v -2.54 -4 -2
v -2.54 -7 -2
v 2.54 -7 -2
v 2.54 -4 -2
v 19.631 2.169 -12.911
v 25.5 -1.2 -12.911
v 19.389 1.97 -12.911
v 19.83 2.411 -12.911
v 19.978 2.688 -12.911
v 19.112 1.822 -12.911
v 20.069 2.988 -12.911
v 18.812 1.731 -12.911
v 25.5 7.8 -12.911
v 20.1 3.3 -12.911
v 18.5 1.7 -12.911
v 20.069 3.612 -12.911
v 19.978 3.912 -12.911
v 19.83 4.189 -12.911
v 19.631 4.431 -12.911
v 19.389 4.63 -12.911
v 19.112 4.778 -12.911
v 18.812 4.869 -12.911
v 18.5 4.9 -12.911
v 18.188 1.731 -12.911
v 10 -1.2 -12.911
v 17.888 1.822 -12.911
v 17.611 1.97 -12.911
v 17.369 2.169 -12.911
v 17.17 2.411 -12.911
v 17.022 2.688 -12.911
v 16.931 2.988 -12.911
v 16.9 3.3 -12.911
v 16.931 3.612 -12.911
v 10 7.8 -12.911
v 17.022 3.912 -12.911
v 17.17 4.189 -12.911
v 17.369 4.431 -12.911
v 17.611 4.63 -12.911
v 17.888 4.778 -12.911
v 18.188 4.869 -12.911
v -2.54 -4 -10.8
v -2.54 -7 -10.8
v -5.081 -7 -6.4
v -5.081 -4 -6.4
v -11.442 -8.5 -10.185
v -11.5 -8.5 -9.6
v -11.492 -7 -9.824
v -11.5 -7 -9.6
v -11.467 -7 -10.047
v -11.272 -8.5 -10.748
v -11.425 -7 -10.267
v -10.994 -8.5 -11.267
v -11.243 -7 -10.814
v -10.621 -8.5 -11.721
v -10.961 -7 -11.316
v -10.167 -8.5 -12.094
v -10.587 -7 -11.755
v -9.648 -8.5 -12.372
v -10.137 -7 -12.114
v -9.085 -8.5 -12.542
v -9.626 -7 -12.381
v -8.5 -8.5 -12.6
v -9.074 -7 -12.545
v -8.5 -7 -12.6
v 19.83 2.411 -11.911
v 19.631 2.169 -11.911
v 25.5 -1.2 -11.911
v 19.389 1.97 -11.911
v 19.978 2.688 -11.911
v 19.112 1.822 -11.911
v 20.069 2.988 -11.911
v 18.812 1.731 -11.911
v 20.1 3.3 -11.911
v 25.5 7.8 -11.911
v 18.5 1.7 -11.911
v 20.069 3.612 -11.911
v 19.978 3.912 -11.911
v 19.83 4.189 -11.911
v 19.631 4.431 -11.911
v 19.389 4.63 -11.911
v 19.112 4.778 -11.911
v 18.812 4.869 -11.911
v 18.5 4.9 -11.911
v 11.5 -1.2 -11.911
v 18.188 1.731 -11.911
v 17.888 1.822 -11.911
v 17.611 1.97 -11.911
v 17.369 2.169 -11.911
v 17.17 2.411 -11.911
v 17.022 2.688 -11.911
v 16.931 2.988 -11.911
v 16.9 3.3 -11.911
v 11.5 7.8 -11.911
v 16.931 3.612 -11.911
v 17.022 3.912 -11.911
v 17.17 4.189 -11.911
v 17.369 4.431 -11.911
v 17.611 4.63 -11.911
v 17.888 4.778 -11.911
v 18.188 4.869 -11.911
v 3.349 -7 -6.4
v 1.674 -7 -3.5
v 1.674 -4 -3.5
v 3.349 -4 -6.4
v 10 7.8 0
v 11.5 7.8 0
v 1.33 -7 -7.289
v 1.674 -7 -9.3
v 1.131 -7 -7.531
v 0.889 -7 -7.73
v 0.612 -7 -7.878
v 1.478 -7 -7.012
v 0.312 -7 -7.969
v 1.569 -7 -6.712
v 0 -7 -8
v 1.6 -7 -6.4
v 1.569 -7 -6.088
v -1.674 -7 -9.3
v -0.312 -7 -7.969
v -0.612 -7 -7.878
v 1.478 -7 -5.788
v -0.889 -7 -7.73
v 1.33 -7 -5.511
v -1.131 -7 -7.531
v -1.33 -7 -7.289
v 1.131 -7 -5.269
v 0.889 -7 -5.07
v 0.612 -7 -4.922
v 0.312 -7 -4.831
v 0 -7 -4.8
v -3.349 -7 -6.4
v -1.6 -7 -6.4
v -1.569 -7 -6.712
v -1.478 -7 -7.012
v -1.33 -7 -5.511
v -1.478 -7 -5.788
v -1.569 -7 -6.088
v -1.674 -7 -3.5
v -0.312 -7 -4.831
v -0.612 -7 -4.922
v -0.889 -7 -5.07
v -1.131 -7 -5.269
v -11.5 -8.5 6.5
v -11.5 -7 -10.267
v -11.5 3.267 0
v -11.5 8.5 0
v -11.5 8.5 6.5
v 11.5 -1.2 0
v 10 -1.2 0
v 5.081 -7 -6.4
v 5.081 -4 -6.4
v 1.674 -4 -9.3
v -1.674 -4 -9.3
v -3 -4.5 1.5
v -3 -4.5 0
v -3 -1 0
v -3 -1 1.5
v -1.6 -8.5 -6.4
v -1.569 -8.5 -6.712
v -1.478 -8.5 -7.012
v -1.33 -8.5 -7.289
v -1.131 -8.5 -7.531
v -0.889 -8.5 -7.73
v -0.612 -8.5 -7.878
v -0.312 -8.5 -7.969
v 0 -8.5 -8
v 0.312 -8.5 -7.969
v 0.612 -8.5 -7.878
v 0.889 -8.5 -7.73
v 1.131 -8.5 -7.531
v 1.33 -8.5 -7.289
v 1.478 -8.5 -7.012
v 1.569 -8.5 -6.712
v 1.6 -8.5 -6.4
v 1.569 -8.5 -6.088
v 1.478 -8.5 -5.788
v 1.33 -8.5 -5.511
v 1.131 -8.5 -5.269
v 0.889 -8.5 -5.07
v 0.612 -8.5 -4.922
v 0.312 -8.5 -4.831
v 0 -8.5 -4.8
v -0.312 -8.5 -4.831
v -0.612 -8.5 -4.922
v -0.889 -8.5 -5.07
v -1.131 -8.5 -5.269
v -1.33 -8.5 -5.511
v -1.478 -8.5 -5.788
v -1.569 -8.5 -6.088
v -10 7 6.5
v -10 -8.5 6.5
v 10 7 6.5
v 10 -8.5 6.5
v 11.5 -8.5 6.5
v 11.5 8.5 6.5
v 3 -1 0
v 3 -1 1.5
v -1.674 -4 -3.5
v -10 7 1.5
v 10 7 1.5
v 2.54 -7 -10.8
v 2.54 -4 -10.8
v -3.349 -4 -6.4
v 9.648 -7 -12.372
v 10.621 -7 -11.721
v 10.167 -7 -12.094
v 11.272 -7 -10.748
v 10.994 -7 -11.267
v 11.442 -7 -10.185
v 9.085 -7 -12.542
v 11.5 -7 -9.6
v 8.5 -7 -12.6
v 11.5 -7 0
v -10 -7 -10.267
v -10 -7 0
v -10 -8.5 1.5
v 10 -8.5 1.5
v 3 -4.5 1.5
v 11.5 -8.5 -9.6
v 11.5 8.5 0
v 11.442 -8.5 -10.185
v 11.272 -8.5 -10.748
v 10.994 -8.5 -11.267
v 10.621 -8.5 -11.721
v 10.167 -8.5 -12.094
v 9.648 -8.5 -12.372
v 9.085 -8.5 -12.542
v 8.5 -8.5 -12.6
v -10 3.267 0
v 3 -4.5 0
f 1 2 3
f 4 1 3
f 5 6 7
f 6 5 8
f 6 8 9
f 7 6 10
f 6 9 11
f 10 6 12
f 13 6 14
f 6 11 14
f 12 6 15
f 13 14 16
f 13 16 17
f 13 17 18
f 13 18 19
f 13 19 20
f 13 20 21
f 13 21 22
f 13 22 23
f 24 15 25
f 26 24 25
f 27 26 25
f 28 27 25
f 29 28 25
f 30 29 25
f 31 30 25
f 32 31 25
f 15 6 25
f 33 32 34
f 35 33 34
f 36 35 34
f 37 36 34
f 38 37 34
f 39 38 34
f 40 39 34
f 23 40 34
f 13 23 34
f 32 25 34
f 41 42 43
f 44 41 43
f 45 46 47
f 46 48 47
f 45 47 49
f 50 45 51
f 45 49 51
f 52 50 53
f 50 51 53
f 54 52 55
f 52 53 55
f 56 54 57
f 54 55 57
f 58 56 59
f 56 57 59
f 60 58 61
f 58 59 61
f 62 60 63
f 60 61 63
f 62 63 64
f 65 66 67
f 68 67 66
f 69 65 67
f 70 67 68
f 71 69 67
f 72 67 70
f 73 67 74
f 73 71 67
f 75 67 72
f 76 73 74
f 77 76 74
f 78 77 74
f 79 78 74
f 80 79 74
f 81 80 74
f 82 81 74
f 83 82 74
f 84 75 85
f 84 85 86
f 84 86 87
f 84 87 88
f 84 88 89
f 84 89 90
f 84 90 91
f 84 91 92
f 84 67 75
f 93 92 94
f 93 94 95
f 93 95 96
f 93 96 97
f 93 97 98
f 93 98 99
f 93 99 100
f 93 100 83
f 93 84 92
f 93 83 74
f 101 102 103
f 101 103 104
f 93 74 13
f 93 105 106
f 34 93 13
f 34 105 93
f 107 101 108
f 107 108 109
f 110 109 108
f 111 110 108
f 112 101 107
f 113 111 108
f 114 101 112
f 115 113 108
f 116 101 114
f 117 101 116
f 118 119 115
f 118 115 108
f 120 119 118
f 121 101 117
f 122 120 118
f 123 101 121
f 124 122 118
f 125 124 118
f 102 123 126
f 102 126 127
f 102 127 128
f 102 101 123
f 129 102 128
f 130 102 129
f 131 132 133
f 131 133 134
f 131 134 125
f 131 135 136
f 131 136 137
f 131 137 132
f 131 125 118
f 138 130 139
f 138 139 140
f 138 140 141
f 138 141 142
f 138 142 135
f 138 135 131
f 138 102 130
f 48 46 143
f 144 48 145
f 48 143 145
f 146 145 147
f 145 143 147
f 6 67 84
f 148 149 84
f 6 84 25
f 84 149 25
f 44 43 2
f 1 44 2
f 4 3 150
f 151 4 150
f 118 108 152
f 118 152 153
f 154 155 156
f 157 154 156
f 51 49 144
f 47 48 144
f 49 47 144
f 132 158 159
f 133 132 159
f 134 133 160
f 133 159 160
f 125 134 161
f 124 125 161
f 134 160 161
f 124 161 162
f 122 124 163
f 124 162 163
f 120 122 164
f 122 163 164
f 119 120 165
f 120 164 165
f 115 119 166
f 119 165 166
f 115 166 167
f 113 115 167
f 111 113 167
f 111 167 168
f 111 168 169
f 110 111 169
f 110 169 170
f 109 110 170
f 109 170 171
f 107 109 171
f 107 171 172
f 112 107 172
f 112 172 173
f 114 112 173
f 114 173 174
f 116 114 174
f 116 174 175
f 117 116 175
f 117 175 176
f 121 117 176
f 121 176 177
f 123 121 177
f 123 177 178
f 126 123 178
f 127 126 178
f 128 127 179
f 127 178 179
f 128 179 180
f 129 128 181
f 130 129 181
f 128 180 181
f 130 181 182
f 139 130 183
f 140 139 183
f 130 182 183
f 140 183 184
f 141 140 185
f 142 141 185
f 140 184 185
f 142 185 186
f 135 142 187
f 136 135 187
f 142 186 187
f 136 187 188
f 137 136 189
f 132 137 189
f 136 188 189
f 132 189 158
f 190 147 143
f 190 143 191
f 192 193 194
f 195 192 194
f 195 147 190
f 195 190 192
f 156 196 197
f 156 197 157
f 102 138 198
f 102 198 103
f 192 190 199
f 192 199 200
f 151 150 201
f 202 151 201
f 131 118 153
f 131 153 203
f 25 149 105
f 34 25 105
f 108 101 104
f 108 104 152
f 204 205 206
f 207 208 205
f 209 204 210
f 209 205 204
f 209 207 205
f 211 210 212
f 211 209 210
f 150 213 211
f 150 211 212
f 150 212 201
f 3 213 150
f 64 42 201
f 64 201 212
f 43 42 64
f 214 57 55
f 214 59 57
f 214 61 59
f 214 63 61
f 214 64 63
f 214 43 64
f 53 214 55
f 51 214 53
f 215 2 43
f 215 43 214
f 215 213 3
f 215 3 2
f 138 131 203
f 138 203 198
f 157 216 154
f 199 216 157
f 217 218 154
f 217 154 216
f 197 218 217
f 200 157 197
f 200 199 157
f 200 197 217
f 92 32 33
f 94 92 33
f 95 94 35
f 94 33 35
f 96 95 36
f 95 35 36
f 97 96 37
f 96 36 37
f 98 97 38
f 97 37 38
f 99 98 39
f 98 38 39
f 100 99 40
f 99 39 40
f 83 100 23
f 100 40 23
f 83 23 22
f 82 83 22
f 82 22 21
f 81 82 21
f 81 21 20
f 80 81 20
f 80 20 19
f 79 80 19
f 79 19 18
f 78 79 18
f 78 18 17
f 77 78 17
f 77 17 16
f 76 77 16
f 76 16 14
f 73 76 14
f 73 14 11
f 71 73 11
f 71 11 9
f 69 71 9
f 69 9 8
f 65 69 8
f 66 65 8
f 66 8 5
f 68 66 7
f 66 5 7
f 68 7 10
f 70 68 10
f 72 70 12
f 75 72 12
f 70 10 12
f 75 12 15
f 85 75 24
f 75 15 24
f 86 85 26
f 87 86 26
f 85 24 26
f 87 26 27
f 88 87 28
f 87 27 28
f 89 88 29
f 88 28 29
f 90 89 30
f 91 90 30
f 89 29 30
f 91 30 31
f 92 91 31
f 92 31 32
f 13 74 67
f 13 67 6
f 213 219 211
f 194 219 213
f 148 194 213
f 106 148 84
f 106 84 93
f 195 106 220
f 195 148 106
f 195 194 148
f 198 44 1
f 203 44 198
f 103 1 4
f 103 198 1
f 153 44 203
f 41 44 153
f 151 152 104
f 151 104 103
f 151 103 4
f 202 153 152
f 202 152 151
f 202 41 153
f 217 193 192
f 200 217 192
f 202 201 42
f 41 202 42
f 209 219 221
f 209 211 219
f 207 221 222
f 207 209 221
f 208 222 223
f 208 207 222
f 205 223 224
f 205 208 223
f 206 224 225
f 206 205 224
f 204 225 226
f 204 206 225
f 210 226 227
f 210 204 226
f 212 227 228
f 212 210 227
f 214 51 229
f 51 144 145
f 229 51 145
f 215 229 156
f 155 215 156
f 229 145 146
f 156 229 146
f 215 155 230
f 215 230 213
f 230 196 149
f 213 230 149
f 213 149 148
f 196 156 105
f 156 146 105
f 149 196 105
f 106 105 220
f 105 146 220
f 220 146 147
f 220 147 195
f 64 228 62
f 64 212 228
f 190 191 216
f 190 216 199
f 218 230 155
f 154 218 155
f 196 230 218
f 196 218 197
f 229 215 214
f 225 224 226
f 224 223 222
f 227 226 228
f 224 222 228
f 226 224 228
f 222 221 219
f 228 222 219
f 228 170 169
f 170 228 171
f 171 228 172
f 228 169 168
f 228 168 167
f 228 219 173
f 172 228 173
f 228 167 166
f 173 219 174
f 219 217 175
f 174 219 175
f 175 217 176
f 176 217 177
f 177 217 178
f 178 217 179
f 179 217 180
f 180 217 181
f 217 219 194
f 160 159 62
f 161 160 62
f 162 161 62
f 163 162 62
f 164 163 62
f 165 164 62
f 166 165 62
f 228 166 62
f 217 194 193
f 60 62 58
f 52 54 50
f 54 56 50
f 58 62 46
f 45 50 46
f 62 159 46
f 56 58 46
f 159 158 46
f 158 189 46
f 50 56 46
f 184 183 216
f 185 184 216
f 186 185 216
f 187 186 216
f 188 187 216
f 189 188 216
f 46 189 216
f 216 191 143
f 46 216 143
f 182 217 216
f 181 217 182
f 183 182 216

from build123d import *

# Parameters (mm, degrees)
SKETCH_1_W             = 23
SKETCH_1_H             = 17
EXTRUDE_1_DEPTH        = 6.5
SKETCH_2_W             = 20
SKETCH_2_H             = 15.5
CUT_EXTRUDE_1_DEPTH    = 5
SKETCH_3_W             = 23
SKETCH_3_H             = 1.5
EXTRUDE_2_DEPTH        = 12.6
FILLET_1_R             = 3
EXTRUDE_3_DEPTH        = 3
HOLE_WIZARD_M3_1_D     = 3.2
EXTRUDE_START          = -11.5
EXTRUDE_6_DEPTH        = 1.5
CUT_EXTRUDE_2534_REACH = 21.059
SKETCH_10_W            = 6
SKETCH_10_H            = 3.5
SKETCH_11_W            = 1.5
SKETCH_11_H            = 9
EXTRUDE_10_DEPTH       = 12.910593501
SKETCH_12_W            = 1
SKETCH_12_H            = 9
EXTRUDE_11_DEPTH       = 14
HOLE_WIZARD_M3_2_D     = 3.2


# Read off the part's stored shape, not the designer's step: 凸台-拉伸6
with BuildPart() as part:
    # 草图1 → 凸台-拉伸1 (new body)
    with BuildSketch(Plane.XY):
        Rectangle(SKETCH_1_W, SKETCH_1_H)
    extrude(amount=EXTRUDE_1_DEPTH)

    # 草图2 → 切除-拉伸1 (cut)
    with BuildSketch(Plane.XY.offset(6.5)):
        with Locations((0, -0.75)):
            Rectangle(SKETCH_2_W, SKETCH_2_H)
    extrude(amount=-CUT_EXTRUDE_1_DEPTH, mode=Mode.SUBTRACT)

    # 草图3 → 凸台-拉伸2 (add)
    with BuildSketch(Plane(origin=(0, 0, 0), x_dir=(-1, 0, 0), z_dir=(0, 0, -1))):
        with Locations((0, -7.75)):
            Rectangle(SKETCH_3_W, SKETCH_3_H)
    extrude(amount=EXTRUDE_2_DEPTH)

    # 圆角1
    fillet_1_edges = [part.edges().sort_by_distance(p)[0] for p in [
        (11.5, -7.75, -12.6),
        (-11.5, -7.75, -12.6),
    ]]
    fillet(fillet_1_edges, radius=FILLET_1_R)

    # 草图4 → 凸台-拉伸3 (add)
    with BuildSketch(Plane(origin=(0, -7, 0), x_dir=(1, 0, 0), z_dir=(0, 1, 0))):
        Polygon((5.080682369, 6.4), (2.540341184, 10.8), (-2.540341184, 10.8), (-5.080682369, 6.4), (-2.540341184, 2), (2.540341184, 2), align=None)
        Polygon((3.348631561, 6.4), (1.674315781, 9.3), (-1.674315781, 9.3), (-3.348631561, 6.4), (-1.674315781, 3.5), (1.674315781, 3.5), align=None, mode=Mode.SUBTRACT)
    extrude(amount=EXTRUDE_3_DEPTH)

    # M3 间隙孔1 (through all)
    with Locations(Plane(origin=(0, -7, 0), x_dir=(1, 0, 0), z_dir=(0, 1, 0))):
        with Locations((0, 6.4)):
            Hole(HOLE_WIZARD_M3_1_D / 2)

    # 凸台-拉伸6 outline → 凸台-拉伸6 (add)
    with BuildSketch(Plane.YZ.offset(EXTRUDE_START)):
        Polygon((-7, 0), (-7, -10.266991259), (3.266991259, 0), align=None)
    extrude(amount=EXTRUDE_6_DEPTH)

    # 草图10 → Cut-Extrude 2534 (cut, up to next)
    with BuildSketch(Plane(origin=(0, 0, 0), x_dir=(-1, 0, 0), z_dir=(0, 0, -1)), mode=Mode.PRIVATE) as cut_extrude_2534_sk1:
        with Locations((0, -2.75)):
            Rectangle(SKETCH_10_W, SKETCH_10_H)
    cut_extrude_2534_tool1 = extrude(cut_extrude_2534_sk1.sketch, amount=-CUT_EXTRUDE_2534_REACH, mode=Mode.PRIVATE) & part.part
    add(cut_extrude_2534_tool1.solids().sort_by_distance((0, -2.75, 0))[0], mode=Mode.SUBTRACT)

    # 草图11 → 凸台-拉伸10 (add)
    with BuildSketch(Plane(origin=(0, 0, 0), x_dir=(-1, 0, 0), z_dir=(0, 0, -1))):
        with Locations((-10.75, 3.3)):
            Rectangle(SKETCH_11_W, SKETCH_11_H)
    extrude(amount=EXTRUDE_10_DEPTH)

    # 草图12 → 凸台-拉伸11 (add)
    with BuildSketch(Plane(origin=(11.5, 0, 0), x_dir=(0, 0, -1), z_dir=(1, 0, 0))):
        with Locations((12.410593501, 3.3)):
            Rectangle(SKETCH_12_W, SKETCH_12_H)
    extrude(amount=EXTRUDE_11_DEPTH)

    # M3 间隙孔2 (through all)
    with Locations(Plane.XY.offset(-11.910593501)):
        with Locations((18.5, 3.3)):
            Hole(HOLE_WIZARD_M3_2_D / 2)


solid = part.part
